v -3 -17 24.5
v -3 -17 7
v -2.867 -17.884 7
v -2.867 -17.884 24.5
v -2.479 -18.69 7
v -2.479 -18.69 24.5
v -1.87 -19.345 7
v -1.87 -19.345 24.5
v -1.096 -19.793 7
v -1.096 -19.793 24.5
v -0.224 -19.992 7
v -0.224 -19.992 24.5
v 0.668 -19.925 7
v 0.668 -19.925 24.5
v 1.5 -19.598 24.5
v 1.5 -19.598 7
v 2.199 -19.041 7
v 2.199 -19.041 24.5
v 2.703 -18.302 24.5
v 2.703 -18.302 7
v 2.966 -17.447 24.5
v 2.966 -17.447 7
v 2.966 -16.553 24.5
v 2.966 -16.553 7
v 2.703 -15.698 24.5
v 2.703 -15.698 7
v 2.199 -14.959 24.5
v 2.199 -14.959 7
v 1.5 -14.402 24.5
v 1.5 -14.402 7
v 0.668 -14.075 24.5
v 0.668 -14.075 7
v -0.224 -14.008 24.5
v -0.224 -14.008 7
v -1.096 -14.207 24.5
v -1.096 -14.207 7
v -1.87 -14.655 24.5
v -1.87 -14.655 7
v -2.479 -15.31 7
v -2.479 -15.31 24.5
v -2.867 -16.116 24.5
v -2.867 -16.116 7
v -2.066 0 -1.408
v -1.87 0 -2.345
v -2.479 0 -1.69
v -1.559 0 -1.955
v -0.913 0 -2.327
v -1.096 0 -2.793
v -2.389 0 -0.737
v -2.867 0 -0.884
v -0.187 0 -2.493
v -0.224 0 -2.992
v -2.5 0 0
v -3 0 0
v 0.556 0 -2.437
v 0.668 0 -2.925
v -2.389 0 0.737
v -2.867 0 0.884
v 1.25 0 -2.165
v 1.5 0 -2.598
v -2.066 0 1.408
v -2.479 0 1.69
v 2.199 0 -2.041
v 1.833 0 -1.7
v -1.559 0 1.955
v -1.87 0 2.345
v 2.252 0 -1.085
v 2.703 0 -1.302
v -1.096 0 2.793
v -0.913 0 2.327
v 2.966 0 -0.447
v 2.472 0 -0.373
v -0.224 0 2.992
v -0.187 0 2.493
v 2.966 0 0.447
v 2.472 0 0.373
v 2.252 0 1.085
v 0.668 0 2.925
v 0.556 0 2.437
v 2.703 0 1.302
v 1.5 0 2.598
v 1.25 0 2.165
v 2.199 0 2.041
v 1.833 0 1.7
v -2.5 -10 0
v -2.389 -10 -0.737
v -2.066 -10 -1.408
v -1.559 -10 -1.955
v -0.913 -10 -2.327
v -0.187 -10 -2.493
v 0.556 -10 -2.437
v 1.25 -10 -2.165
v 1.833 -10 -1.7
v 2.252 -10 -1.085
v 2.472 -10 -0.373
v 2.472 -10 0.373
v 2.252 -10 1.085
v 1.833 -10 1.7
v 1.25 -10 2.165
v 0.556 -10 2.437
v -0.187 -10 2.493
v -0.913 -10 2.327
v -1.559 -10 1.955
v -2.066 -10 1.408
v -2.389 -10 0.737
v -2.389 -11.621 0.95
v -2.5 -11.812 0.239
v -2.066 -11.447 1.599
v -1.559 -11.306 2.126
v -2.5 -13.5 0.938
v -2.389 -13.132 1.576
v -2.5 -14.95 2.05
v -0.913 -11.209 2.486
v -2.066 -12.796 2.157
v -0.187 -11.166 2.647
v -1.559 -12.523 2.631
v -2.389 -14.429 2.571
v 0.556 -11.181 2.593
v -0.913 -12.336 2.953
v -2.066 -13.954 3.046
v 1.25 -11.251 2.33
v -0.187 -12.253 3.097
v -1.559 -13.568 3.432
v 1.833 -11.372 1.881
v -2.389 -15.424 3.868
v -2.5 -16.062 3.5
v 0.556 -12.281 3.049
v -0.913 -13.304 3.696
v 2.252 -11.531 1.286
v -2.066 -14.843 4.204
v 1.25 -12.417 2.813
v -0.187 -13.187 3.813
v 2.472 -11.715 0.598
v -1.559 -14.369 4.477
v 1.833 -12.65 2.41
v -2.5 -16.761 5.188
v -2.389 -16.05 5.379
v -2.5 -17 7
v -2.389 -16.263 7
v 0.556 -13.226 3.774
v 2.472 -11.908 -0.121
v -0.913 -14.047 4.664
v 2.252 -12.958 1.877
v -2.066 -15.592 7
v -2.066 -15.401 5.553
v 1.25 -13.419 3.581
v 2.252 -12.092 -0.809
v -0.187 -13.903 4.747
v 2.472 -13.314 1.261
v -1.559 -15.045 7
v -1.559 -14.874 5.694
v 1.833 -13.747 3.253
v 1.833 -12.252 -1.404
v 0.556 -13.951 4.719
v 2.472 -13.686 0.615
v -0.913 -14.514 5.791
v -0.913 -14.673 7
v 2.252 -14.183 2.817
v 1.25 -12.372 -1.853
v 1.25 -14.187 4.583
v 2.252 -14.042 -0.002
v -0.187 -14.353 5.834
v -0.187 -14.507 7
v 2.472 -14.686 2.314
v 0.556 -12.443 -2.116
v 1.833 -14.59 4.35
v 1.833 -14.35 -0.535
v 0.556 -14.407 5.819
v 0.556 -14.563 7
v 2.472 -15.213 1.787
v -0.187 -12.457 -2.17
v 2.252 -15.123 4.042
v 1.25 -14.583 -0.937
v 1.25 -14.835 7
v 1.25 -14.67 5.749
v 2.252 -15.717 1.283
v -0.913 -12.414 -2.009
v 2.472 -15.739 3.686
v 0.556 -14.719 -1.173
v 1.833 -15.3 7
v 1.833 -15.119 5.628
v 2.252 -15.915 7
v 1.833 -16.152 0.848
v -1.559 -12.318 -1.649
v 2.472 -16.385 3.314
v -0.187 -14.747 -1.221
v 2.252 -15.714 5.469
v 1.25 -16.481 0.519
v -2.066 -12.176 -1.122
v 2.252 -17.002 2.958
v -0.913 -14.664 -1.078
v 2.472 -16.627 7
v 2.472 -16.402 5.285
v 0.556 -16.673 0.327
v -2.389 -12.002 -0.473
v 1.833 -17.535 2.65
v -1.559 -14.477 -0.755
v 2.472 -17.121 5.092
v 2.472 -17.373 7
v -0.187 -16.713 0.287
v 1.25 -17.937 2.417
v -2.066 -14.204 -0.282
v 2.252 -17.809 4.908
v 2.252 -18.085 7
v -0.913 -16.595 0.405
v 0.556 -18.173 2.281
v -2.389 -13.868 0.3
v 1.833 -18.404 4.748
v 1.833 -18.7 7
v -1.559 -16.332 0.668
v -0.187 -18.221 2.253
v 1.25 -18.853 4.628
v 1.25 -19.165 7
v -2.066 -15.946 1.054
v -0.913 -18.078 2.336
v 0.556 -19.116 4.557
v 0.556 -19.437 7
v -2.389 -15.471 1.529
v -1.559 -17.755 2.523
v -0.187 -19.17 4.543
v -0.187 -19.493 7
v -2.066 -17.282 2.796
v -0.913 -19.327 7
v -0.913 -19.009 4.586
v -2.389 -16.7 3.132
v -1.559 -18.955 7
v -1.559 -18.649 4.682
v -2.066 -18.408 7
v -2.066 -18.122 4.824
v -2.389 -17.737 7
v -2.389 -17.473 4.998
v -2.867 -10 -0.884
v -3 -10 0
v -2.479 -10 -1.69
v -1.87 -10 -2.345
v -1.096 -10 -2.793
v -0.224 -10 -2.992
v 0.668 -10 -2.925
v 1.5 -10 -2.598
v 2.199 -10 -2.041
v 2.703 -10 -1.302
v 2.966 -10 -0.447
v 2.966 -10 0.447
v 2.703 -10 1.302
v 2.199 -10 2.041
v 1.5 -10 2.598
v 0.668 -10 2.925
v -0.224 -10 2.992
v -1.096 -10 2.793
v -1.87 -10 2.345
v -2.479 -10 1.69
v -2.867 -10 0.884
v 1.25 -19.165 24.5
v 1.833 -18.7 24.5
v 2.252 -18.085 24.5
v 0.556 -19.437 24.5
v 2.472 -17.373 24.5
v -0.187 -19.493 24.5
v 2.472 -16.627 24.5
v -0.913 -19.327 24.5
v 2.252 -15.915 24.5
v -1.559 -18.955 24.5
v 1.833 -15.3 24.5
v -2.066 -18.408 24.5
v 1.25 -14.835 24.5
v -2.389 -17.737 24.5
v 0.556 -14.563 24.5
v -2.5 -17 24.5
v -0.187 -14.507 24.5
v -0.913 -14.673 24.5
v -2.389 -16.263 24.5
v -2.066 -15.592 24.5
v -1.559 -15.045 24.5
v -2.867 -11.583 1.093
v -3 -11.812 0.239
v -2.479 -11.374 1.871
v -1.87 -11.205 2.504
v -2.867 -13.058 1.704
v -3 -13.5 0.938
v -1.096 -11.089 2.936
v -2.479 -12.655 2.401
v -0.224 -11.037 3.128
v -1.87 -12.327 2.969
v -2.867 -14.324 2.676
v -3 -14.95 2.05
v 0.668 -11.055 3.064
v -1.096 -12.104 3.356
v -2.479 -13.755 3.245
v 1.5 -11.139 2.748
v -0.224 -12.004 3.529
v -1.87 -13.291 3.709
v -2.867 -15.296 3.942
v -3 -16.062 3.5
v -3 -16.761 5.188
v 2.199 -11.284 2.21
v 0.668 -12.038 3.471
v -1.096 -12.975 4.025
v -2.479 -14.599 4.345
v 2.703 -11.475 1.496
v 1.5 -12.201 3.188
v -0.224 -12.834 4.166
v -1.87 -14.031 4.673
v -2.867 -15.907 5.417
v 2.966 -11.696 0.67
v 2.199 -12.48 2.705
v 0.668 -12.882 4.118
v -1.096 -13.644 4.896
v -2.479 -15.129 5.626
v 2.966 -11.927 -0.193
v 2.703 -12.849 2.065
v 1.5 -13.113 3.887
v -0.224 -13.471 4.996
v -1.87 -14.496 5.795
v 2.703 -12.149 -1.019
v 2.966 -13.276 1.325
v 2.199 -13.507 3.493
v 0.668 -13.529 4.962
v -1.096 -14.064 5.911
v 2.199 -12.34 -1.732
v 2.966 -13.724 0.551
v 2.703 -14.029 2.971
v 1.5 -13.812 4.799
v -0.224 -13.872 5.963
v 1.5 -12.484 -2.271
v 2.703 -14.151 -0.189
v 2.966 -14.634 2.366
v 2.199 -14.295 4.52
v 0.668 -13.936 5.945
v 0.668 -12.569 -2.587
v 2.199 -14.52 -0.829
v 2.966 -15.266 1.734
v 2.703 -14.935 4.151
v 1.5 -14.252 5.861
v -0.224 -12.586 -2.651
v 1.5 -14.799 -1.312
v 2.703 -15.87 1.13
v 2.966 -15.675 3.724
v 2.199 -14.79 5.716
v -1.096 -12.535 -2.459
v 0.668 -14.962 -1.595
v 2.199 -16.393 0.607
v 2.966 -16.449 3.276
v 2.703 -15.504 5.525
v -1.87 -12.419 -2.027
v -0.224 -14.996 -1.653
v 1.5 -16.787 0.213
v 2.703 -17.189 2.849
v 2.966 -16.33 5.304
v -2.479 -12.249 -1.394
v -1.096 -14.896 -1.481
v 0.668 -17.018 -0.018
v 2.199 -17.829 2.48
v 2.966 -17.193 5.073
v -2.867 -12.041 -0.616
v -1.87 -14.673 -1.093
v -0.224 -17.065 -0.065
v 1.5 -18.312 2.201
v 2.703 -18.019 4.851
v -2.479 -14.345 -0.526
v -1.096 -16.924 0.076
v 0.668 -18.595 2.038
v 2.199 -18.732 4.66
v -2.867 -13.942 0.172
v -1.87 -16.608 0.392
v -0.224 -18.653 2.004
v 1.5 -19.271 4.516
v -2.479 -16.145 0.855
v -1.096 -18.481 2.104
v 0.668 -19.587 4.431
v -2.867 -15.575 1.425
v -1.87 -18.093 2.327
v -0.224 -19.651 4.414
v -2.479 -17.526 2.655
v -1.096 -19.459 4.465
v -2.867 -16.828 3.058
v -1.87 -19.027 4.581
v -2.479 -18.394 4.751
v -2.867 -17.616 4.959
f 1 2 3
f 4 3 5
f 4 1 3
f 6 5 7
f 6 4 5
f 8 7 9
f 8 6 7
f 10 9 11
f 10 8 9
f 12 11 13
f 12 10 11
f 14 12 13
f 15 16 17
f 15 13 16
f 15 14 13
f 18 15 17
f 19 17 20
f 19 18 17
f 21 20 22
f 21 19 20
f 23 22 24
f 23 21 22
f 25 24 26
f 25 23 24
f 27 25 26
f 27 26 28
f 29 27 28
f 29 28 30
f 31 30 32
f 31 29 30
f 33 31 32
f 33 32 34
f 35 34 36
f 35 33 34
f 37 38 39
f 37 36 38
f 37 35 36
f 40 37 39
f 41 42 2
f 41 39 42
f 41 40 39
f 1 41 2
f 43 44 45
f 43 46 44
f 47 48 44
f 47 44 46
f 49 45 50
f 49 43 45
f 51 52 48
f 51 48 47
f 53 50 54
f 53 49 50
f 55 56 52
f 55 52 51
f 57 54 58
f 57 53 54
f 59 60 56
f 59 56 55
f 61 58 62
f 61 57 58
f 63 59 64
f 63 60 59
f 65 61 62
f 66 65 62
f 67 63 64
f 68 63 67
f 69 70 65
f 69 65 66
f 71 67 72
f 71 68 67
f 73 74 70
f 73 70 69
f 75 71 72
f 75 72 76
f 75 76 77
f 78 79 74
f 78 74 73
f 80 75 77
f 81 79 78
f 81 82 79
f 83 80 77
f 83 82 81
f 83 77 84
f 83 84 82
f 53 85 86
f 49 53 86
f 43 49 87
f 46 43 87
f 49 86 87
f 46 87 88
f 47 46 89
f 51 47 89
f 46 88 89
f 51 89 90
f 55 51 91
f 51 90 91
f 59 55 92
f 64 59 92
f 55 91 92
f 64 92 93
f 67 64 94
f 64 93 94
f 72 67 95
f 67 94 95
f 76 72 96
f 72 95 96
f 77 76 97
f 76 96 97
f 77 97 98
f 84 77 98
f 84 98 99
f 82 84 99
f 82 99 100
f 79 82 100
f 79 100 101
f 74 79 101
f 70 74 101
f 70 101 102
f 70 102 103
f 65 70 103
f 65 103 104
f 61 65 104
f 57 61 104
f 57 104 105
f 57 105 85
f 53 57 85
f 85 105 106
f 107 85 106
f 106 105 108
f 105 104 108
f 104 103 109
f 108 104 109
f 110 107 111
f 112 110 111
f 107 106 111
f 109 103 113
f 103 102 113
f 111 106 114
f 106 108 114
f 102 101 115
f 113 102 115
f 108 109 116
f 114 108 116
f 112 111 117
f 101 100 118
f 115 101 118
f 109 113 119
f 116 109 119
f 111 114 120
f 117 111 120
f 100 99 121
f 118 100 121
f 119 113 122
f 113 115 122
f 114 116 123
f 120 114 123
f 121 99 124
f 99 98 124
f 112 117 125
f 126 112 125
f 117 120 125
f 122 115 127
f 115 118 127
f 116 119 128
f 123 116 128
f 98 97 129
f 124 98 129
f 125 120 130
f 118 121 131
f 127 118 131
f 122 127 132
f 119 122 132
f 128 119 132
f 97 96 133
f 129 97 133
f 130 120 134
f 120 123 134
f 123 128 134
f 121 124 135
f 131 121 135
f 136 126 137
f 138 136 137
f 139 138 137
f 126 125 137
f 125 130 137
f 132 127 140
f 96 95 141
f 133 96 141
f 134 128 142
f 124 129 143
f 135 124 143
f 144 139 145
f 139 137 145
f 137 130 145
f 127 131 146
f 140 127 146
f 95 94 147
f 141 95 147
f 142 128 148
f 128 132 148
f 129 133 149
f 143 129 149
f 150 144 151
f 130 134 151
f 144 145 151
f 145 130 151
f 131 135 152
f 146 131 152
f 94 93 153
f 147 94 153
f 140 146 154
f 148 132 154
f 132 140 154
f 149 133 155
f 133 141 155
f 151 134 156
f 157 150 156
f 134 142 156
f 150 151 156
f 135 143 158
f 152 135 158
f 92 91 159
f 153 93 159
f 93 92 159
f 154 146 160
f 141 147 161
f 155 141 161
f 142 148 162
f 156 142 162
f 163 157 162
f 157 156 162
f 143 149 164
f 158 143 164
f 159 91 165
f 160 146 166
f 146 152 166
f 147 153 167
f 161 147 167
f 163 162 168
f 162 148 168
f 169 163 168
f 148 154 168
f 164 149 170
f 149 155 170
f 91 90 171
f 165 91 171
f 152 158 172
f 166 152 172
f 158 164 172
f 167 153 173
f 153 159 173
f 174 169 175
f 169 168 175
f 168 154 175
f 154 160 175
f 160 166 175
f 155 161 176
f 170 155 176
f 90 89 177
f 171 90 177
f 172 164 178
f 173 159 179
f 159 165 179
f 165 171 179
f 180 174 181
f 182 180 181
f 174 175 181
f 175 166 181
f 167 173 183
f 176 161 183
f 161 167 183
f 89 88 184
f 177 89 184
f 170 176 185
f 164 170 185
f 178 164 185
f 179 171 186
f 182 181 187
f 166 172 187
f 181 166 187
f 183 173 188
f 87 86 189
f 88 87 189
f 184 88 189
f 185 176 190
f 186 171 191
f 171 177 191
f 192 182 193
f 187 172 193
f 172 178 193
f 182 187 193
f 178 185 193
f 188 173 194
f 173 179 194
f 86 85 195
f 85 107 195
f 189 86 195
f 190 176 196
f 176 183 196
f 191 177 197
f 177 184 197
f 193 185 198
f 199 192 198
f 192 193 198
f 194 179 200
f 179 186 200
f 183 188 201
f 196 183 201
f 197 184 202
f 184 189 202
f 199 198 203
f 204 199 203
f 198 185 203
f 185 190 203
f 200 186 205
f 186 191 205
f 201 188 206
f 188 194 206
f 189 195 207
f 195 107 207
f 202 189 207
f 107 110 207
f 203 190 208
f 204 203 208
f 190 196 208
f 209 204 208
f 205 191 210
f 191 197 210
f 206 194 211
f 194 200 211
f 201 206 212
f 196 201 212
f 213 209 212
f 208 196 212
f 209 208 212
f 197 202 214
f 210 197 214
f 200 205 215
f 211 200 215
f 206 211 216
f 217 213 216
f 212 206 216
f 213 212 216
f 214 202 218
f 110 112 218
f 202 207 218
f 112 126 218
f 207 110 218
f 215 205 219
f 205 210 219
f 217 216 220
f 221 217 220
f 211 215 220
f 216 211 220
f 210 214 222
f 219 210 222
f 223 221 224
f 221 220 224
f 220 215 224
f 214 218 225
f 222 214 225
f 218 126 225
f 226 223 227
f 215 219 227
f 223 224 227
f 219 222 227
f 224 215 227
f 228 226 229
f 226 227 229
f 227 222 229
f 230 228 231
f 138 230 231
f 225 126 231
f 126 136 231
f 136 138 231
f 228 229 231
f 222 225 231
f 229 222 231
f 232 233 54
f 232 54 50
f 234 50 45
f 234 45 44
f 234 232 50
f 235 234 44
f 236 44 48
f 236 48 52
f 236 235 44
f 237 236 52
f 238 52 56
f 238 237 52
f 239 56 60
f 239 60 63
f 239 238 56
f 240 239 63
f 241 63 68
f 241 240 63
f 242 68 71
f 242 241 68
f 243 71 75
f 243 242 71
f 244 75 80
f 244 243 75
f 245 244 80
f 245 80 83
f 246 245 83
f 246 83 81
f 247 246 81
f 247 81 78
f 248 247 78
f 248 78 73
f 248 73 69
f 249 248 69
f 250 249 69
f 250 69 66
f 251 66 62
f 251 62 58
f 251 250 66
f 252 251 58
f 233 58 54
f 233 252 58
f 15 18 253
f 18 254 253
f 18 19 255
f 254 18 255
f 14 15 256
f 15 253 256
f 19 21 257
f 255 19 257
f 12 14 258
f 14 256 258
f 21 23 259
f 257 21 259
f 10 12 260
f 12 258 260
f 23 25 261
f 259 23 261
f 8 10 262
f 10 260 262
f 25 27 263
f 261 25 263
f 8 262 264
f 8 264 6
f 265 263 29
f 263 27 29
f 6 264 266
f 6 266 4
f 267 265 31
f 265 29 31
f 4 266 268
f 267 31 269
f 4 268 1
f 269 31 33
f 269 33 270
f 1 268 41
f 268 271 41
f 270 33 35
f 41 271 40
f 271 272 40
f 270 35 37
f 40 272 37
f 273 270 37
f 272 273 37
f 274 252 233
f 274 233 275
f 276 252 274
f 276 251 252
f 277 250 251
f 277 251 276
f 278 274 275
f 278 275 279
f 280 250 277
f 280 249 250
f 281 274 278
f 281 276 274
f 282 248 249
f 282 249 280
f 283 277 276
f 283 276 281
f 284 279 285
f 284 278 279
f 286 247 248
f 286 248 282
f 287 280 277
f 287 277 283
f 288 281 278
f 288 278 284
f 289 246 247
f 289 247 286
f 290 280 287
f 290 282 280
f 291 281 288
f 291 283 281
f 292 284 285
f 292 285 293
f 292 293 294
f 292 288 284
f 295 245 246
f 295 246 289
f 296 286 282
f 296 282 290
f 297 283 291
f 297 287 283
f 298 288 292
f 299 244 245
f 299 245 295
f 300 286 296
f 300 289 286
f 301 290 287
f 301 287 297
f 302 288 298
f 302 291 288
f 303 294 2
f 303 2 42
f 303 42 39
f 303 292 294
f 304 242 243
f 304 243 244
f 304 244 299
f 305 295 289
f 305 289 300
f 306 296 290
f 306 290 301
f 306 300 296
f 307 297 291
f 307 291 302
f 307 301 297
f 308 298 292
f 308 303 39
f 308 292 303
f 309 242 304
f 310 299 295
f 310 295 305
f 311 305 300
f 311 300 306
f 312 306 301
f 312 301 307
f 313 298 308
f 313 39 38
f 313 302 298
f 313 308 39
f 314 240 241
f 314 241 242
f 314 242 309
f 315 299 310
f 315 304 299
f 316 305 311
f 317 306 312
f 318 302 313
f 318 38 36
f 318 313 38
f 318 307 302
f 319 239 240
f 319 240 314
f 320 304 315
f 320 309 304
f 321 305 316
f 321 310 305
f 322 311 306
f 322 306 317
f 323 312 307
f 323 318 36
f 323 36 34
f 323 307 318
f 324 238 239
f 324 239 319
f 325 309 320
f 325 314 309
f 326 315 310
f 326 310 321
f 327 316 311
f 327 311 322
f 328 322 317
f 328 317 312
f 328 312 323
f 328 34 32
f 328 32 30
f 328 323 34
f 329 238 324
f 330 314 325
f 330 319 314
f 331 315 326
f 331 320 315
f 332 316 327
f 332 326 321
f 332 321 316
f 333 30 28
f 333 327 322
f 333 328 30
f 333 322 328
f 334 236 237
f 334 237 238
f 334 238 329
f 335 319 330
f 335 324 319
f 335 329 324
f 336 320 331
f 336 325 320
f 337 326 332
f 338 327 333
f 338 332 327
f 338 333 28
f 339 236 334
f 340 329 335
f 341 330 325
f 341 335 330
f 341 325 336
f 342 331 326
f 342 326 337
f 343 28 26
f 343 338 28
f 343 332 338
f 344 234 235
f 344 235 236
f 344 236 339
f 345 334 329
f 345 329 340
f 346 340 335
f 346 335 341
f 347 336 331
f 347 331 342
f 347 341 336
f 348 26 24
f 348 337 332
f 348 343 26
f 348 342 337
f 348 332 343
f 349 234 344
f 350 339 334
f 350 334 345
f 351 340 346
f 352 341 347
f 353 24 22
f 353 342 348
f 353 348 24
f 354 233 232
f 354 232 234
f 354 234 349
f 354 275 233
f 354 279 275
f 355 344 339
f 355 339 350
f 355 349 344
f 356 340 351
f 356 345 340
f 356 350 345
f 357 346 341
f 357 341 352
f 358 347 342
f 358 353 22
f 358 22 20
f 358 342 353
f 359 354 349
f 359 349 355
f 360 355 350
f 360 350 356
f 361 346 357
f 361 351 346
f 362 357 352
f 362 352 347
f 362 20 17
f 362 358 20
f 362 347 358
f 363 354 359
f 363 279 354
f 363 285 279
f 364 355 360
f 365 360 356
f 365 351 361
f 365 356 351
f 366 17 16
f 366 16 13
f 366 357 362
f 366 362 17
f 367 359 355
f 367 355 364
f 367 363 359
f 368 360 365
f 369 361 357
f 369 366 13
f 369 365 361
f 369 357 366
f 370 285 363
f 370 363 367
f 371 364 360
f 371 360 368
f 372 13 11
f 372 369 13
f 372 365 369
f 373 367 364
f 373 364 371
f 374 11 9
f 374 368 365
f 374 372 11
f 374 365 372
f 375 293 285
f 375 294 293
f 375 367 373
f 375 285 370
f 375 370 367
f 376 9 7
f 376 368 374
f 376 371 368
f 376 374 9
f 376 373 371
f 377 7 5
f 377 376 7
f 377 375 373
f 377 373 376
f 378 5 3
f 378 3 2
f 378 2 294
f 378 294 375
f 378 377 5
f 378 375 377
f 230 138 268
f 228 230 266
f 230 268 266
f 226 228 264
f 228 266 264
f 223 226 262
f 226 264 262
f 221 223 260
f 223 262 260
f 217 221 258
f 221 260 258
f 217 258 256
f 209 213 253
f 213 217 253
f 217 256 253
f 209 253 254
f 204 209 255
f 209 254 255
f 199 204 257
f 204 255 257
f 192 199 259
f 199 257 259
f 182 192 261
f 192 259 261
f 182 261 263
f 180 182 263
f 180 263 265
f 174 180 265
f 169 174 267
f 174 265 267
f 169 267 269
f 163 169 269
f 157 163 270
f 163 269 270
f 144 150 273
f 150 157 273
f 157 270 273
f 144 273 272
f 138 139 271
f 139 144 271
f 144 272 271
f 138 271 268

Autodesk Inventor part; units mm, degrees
ref_plane "YZ Plane" through (0, 0, 0) normal (1, 0, 0) x (0, 1, 0)
ref_plane "XZ Plane" through (0, 0, 0) normal (0, 1, 0) x (-1, 0, 0)
ref_plane "XY Plane" through (0, 0, 0) normal (0, 0, 1) x (1, 0, 0)
sketch "Sketch1" plane through (0, 0, 0) normal (0, 1, 0) x (-1, 0, 0)
  circle A0 centre (0, 0) radius 3
  circle A1 centre (0, 0) radius 2.5
  dimension "d0" = 6
  dimension "d4" = 5
sketch "Sketch2" plane through (0, 0, 0) normal (1, 0, 0) x (0, 1, 0)
  line L0 (0, 0) -> (-10, 0)
  arc A0 (-17, 7) -> (-10, 0) centre (-10, 7) ccw
  line L1 (-17, 7) -> (-17, 24.5)
  line L2 (0, -3) -> (0, 3) projected
  dimension "d1" = 24.5
  dimension "d2" = 7
  dimension "d3" = 17
sweep "Sweep1" add profiles "Sketch1" path "Sketch2" path curves L0 A0 L1
properties part number "24"
